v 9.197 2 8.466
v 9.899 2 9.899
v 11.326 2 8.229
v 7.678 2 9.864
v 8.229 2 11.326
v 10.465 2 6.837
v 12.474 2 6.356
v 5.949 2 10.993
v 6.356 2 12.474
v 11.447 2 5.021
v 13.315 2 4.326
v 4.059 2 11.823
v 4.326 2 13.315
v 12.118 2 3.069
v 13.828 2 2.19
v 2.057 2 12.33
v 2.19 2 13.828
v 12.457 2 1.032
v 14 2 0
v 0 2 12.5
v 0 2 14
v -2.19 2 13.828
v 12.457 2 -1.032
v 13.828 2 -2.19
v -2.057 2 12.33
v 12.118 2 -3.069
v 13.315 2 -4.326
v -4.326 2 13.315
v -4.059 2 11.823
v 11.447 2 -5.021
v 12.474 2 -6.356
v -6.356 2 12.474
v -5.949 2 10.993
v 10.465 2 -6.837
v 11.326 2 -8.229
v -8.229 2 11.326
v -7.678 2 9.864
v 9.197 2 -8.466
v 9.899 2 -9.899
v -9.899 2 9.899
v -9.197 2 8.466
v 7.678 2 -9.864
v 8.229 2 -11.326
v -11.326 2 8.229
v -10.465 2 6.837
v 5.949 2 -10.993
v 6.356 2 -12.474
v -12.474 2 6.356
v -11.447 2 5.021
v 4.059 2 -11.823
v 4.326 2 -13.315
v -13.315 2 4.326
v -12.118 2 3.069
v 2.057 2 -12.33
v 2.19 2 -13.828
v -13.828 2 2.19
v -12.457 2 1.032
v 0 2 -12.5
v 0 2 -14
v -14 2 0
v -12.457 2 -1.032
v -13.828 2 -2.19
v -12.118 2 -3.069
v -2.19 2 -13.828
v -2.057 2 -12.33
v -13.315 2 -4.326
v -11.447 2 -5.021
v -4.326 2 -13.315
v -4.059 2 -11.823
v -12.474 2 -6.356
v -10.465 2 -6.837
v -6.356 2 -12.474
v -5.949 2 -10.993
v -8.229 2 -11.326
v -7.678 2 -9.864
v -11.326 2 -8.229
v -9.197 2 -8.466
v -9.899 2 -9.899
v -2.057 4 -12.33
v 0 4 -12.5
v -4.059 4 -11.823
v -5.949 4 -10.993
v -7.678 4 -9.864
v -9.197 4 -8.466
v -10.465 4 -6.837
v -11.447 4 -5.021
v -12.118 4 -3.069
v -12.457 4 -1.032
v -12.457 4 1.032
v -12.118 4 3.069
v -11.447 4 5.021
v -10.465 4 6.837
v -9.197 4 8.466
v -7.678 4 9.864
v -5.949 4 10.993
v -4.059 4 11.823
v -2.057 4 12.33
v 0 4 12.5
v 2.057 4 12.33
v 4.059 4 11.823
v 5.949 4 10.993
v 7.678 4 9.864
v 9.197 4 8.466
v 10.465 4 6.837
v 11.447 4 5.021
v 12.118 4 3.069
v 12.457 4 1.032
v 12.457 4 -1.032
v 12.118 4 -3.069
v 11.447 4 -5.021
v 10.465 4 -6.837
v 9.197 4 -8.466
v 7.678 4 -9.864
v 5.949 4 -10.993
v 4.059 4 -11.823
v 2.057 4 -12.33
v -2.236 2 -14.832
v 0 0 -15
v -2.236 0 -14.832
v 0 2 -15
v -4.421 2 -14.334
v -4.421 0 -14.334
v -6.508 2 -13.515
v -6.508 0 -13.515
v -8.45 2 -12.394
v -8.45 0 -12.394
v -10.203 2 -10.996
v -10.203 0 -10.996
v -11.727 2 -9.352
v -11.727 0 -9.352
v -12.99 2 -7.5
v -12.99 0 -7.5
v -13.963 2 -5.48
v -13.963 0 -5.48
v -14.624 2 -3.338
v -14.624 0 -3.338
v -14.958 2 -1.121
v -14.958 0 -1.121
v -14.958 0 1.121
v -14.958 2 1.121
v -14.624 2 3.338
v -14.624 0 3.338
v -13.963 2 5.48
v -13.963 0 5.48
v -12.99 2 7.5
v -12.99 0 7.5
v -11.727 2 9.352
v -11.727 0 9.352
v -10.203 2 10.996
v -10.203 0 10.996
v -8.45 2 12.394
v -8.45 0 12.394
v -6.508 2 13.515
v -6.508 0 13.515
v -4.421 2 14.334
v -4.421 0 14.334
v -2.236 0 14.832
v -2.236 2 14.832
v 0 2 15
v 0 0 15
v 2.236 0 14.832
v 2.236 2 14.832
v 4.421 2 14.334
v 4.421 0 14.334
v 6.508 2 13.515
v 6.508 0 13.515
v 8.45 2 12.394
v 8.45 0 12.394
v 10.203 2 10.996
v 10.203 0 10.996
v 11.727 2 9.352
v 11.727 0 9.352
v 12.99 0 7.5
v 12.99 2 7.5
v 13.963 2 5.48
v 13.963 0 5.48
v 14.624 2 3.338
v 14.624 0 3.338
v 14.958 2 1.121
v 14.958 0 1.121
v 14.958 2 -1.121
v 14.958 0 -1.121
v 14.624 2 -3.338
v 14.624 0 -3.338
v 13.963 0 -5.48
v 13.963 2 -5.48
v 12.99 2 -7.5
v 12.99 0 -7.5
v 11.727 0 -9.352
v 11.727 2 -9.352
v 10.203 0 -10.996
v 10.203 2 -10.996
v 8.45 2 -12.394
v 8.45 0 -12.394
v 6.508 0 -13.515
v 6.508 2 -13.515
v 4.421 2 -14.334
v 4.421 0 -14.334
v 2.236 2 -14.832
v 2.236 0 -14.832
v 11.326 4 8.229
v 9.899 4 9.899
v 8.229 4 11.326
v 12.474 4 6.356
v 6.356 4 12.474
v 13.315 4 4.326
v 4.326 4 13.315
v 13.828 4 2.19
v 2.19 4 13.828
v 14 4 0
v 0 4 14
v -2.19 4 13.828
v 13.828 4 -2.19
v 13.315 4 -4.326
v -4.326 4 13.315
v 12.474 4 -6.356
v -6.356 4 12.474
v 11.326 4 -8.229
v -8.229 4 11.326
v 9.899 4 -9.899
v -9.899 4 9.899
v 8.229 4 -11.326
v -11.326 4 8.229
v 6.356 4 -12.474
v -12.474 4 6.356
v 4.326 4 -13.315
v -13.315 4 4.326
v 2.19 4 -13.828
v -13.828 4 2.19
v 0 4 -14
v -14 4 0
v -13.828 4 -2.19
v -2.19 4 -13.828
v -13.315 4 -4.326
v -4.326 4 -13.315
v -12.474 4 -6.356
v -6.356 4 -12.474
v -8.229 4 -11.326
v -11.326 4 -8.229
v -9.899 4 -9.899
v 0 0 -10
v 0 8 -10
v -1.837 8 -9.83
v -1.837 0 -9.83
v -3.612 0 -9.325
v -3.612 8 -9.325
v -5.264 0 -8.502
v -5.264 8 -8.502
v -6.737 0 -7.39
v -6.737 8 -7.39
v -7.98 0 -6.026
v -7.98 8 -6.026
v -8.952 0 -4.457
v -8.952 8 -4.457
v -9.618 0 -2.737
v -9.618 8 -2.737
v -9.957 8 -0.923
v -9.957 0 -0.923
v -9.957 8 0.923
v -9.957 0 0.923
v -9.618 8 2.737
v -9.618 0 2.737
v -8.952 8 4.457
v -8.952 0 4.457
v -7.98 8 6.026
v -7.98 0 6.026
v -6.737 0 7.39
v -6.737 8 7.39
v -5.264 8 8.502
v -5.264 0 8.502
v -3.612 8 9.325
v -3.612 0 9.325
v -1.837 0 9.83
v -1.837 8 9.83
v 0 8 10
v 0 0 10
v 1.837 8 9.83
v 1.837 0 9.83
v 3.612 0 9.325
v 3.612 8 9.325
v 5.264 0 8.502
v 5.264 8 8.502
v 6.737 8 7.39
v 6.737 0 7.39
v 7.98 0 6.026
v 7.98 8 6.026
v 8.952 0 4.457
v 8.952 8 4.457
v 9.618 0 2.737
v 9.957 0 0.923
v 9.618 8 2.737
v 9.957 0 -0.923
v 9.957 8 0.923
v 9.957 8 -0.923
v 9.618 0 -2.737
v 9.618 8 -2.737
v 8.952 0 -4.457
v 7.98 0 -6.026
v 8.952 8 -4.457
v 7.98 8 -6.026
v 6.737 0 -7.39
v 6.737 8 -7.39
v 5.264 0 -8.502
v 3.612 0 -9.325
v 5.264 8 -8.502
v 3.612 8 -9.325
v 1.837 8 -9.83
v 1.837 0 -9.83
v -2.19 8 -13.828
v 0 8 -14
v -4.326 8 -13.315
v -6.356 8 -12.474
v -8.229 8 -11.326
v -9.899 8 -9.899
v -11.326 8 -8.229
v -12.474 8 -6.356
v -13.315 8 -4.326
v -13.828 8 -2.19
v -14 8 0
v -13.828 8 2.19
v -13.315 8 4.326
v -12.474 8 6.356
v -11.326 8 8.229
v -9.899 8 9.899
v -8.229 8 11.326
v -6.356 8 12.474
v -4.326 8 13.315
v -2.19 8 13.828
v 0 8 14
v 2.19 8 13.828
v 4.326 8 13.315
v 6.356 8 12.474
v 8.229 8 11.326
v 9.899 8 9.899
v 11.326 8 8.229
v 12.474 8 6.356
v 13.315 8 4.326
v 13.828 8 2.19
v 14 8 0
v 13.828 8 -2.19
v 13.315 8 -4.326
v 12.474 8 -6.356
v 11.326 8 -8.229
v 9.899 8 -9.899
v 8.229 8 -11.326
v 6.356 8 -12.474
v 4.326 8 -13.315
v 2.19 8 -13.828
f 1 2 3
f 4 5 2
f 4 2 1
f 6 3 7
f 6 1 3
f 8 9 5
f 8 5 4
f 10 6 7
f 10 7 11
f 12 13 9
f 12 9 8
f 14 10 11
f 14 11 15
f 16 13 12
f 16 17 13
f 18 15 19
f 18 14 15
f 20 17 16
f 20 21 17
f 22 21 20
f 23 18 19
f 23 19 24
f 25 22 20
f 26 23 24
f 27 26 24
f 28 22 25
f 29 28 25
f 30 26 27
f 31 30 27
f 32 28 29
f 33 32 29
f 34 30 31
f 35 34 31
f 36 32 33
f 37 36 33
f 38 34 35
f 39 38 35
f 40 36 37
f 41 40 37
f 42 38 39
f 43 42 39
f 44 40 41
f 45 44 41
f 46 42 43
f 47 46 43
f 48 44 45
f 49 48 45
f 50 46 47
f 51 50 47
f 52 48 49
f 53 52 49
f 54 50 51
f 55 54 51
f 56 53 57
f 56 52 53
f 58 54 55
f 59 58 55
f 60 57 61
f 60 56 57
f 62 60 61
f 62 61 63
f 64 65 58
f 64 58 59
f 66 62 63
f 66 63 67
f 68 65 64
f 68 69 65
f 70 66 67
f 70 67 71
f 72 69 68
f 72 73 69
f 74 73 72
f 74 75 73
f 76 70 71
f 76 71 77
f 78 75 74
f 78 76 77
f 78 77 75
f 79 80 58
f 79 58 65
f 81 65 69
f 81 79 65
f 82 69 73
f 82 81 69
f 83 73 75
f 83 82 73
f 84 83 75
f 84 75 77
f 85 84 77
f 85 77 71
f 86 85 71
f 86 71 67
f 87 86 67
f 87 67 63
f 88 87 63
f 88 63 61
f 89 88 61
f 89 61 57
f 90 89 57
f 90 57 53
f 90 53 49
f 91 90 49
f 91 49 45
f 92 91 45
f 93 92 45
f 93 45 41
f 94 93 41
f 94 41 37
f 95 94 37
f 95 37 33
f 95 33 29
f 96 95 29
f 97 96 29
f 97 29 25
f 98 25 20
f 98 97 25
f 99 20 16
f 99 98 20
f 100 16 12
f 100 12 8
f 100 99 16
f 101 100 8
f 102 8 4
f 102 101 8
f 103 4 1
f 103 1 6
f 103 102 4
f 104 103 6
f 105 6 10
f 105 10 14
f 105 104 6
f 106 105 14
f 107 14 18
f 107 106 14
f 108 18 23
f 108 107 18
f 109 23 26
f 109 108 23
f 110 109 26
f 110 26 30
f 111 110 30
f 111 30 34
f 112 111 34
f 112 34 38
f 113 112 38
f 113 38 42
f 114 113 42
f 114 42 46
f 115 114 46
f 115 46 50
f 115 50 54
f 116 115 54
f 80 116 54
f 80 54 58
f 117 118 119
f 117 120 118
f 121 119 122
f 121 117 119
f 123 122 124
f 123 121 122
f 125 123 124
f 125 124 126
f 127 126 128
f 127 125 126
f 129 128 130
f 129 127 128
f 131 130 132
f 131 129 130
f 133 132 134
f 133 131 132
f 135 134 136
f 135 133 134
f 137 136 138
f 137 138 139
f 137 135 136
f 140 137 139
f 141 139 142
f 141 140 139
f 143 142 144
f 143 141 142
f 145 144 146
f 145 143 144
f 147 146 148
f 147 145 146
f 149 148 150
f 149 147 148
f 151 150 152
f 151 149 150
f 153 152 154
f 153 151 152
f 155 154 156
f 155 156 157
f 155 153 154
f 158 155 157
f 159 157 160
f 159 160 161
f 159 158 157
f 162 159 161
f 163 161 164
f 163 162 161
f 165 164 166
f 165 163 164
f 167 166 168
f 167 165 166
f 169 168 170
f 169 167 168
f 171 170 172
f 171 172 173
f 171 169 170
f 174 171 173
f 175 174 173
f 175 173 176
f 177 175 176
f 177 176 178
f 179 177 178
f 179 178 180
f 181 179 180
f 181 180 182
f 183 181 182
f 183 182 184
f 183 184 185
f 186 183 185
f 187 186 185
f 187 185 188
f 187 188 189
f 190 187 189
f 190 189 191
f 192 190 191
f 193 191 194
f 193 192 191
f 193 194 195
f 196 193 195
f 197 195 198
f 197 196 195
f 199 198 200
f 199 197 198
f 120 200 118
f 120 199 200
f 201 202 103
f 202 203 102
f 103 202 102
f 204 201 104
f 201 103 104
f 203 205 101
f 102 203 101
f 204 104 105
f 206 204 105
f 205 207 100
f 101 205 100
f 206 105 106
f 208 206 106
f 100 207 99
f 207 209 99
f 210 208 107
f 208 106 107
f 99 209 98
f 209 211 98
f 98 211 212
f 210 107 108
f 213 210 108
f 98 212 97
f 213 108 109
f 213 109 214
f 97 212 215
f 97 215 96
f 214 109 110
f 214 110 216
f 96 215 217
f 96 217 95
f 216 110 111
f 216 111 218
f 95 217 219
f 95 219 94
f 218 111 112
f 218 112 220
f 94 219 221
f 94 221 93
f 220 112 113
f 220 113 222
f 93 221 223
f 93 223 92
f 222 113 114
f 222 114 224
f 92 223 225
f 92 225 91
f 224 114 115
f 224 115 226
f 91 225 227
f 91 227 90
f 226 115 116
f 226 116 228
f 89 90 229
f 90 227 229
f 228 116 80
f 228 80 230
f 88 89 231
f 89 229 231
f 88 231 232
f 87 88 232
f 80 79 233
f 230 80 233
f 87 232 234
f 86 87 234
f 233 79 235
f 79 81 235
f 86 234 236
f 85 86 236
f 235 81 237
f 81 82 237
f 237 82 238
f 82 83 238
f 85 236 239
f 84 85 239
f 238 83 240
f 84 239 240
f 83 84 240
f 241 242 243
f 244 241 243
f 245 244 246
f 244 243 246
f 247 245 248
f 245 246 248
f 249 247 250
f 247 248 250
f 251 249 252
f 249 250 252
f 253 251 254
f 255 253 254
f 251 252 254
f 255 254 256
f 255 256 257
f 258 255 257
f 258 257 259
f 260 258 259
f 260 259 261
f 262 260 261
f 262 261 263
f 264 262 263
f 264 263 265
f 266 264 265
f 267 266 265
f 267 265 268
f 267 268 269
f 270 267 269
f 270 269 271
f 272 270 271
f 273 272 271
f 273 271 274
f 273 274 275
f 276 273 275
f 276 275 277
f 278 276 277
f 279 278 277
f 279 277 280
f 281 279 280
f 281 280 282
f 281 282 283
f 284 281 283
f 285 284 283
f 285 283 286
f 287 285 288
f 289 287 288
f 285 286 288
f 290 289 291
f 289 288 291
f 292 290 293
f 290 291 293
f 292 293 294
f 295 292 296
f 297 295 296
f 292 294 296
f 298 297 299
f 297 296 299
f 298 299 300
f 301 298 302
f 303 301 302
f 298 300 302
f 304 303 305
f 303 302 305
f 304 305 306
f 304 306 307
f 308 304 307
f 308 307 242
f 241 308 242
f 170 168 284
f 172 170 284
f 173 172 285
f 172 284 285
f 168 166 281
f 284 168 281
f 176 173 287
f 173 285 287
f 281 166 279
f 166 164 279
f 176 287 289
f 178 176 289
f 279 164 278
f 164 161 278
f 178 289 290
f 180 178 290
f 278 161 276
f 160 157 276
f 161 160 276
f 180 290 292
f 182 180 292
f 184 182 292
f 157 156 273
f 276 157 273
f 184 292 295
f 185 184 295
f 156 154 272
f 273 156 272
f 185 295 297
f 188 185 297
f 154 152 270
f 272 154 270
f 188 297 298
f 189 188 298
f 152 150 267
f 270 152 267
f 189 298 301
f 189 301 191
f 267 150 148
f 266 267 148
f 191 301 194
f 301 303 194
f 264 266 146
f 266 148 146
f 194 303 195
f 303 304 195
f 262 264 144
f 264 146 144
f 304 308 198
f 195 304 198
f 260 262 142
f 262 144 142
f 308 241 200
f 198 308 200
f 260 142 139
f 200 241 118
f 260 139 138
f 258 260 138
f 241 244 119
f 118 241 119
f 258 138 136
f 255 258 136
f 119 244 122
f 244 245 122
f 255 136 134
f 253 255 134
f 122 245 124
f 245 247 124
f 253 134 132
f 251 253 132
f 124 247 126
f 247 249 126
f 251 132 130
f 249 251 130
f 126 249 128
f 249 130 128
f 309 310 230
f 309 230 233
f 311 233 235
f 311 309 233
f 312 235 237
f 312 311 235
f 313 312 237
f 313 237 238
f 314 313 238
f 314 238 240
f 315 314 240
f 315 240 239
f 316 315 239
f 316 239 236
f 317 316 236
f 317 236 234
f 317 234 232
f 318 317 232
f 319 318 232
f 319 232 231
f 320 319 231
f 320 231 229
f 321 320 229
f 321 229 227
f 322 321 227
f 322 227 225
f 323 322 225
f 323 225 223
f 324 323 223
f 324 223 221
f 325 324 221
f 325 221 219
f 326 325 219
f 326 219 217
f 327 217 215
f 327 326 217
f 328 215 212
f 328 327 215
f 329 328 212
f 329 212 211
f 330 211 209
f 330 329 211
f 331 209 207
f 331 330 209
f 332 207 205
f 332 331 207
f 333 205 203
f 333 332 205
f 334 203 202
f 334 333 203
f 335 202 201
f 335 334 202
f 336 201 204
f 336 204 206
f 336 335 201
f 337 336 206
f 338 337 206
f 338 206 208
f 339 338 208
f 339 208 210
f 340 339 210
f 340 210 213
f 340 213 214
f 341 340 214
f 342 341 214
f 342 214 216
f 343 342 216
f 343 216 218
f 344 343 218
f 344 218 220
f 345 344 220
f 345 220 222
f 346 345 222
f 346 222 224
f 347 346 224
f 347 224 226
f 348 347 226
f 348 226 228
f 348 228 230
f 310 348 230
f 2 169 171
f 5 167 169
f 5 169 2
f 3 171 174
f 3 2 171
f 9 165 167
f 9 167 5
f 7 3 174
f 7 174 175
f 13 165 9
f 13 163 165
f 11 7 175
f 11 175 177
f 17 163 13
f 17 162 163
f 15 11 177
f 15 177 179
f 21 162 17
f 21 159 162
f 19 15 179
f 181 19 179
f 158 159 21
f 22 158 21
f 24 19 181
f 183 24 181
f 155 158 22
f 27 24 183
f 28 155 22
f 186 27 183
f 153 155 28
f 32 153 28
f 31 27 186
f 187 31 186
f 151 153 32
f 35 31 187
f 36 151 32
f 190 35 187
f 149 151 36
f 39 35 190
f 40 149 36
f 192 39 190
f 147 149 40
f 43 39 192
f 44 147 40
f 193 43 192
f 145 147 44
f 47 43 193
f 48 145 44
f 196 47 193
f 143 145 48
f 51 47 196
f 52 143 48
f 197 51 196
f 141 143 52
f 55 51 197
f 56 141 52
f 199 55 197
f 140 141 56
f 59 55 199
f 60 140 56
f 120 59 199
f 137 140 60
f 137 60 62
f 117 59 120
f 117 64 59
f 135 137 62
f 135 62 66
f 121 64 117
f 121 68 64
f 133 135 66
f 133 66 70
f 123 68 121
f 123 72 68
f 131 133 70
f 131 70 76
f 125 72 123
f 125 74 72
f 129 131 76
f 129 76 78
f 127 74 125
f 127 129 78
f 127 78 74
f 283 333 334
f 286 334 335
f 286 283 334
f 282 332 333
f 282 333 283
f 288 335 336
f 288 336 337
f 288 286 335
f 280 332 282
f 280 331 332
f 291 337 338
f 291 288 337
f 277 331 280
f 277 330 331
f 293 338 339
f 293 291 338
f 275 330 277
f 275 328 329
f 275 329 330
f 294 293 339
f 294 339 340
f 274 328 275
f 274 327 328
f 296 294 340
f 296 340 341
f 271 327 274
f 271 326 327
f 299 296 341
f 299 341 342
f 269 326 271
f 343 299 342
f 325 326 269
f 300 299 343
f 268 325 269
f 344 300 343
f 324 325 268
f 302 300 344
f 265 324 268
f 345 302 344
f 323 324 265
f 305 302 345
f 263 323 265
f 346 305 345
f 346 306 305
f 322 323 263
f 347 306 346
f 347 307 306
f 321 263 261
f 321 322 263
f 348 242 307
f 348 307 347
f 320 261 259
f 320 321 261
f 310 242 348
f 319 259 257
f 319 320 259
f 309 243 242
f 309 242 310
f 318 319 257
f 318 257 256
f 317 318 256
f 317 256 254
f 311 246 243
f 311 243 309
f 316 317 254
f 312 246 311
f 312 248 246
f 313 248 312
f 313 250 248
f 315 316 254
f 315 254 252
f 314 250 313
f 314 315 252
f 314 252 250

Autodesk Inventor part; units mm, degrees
ref_plane "YZ Plane" through (0, 0, 0) normal (1, 0, 0) x (0, 1, 0)
ref_plane "XZ Plane" through (0, 0, 0) normal (0, 1, 0) x (-1, 0, 0)
ref_plane "XY Plane" through (0, 0, 0) normal (0, 0, 1) x (1, 0, 0)
sketch "Sketch1" plane through (0, 0, 0) normal (1, 0, 0) x (0, 1, 0)
  line L0 (0, 0) -> (7.3009, 0)
  line L1 (0, -10) -> (8, -10)
  line L2 (0, -10) -> (0, -15)
  line L3 (0, -15) -> (2, -15)
  line L4 (2, -15) -> (2, -14)
  line L5 (2, -14) -> (8, -14)
  line L6 (8, -14) -> (8, -10)
  line L7 (2, -14) -> (2, -12.5)
  line L8 (2, -12.5) -> (4, -12.5)
  line L9 (4, -12.5) -> (4, -14)
  point P0 (4, -10)
  dimension "d0" = 20
  dimension "d1" = 6
  dimension "d2" = 2
  dimension "d3" = 28
  dimension "d4" = 30
  dimension "d8" = 2
  dimension "d9" = 1.5
revolve "Revolution1" add sketch "Sketch1" angle 360 about axis through (0, 0, 0) along (0, 1, 0) contours L1 L6 L5 L9 L8 L7 L4 L3 L2
thread "Thread1" size "M28x1" class "6g" standard "ANSI Metric M Profile" full length
properties part number "034" material "Stainless Steel, Austenitic"
